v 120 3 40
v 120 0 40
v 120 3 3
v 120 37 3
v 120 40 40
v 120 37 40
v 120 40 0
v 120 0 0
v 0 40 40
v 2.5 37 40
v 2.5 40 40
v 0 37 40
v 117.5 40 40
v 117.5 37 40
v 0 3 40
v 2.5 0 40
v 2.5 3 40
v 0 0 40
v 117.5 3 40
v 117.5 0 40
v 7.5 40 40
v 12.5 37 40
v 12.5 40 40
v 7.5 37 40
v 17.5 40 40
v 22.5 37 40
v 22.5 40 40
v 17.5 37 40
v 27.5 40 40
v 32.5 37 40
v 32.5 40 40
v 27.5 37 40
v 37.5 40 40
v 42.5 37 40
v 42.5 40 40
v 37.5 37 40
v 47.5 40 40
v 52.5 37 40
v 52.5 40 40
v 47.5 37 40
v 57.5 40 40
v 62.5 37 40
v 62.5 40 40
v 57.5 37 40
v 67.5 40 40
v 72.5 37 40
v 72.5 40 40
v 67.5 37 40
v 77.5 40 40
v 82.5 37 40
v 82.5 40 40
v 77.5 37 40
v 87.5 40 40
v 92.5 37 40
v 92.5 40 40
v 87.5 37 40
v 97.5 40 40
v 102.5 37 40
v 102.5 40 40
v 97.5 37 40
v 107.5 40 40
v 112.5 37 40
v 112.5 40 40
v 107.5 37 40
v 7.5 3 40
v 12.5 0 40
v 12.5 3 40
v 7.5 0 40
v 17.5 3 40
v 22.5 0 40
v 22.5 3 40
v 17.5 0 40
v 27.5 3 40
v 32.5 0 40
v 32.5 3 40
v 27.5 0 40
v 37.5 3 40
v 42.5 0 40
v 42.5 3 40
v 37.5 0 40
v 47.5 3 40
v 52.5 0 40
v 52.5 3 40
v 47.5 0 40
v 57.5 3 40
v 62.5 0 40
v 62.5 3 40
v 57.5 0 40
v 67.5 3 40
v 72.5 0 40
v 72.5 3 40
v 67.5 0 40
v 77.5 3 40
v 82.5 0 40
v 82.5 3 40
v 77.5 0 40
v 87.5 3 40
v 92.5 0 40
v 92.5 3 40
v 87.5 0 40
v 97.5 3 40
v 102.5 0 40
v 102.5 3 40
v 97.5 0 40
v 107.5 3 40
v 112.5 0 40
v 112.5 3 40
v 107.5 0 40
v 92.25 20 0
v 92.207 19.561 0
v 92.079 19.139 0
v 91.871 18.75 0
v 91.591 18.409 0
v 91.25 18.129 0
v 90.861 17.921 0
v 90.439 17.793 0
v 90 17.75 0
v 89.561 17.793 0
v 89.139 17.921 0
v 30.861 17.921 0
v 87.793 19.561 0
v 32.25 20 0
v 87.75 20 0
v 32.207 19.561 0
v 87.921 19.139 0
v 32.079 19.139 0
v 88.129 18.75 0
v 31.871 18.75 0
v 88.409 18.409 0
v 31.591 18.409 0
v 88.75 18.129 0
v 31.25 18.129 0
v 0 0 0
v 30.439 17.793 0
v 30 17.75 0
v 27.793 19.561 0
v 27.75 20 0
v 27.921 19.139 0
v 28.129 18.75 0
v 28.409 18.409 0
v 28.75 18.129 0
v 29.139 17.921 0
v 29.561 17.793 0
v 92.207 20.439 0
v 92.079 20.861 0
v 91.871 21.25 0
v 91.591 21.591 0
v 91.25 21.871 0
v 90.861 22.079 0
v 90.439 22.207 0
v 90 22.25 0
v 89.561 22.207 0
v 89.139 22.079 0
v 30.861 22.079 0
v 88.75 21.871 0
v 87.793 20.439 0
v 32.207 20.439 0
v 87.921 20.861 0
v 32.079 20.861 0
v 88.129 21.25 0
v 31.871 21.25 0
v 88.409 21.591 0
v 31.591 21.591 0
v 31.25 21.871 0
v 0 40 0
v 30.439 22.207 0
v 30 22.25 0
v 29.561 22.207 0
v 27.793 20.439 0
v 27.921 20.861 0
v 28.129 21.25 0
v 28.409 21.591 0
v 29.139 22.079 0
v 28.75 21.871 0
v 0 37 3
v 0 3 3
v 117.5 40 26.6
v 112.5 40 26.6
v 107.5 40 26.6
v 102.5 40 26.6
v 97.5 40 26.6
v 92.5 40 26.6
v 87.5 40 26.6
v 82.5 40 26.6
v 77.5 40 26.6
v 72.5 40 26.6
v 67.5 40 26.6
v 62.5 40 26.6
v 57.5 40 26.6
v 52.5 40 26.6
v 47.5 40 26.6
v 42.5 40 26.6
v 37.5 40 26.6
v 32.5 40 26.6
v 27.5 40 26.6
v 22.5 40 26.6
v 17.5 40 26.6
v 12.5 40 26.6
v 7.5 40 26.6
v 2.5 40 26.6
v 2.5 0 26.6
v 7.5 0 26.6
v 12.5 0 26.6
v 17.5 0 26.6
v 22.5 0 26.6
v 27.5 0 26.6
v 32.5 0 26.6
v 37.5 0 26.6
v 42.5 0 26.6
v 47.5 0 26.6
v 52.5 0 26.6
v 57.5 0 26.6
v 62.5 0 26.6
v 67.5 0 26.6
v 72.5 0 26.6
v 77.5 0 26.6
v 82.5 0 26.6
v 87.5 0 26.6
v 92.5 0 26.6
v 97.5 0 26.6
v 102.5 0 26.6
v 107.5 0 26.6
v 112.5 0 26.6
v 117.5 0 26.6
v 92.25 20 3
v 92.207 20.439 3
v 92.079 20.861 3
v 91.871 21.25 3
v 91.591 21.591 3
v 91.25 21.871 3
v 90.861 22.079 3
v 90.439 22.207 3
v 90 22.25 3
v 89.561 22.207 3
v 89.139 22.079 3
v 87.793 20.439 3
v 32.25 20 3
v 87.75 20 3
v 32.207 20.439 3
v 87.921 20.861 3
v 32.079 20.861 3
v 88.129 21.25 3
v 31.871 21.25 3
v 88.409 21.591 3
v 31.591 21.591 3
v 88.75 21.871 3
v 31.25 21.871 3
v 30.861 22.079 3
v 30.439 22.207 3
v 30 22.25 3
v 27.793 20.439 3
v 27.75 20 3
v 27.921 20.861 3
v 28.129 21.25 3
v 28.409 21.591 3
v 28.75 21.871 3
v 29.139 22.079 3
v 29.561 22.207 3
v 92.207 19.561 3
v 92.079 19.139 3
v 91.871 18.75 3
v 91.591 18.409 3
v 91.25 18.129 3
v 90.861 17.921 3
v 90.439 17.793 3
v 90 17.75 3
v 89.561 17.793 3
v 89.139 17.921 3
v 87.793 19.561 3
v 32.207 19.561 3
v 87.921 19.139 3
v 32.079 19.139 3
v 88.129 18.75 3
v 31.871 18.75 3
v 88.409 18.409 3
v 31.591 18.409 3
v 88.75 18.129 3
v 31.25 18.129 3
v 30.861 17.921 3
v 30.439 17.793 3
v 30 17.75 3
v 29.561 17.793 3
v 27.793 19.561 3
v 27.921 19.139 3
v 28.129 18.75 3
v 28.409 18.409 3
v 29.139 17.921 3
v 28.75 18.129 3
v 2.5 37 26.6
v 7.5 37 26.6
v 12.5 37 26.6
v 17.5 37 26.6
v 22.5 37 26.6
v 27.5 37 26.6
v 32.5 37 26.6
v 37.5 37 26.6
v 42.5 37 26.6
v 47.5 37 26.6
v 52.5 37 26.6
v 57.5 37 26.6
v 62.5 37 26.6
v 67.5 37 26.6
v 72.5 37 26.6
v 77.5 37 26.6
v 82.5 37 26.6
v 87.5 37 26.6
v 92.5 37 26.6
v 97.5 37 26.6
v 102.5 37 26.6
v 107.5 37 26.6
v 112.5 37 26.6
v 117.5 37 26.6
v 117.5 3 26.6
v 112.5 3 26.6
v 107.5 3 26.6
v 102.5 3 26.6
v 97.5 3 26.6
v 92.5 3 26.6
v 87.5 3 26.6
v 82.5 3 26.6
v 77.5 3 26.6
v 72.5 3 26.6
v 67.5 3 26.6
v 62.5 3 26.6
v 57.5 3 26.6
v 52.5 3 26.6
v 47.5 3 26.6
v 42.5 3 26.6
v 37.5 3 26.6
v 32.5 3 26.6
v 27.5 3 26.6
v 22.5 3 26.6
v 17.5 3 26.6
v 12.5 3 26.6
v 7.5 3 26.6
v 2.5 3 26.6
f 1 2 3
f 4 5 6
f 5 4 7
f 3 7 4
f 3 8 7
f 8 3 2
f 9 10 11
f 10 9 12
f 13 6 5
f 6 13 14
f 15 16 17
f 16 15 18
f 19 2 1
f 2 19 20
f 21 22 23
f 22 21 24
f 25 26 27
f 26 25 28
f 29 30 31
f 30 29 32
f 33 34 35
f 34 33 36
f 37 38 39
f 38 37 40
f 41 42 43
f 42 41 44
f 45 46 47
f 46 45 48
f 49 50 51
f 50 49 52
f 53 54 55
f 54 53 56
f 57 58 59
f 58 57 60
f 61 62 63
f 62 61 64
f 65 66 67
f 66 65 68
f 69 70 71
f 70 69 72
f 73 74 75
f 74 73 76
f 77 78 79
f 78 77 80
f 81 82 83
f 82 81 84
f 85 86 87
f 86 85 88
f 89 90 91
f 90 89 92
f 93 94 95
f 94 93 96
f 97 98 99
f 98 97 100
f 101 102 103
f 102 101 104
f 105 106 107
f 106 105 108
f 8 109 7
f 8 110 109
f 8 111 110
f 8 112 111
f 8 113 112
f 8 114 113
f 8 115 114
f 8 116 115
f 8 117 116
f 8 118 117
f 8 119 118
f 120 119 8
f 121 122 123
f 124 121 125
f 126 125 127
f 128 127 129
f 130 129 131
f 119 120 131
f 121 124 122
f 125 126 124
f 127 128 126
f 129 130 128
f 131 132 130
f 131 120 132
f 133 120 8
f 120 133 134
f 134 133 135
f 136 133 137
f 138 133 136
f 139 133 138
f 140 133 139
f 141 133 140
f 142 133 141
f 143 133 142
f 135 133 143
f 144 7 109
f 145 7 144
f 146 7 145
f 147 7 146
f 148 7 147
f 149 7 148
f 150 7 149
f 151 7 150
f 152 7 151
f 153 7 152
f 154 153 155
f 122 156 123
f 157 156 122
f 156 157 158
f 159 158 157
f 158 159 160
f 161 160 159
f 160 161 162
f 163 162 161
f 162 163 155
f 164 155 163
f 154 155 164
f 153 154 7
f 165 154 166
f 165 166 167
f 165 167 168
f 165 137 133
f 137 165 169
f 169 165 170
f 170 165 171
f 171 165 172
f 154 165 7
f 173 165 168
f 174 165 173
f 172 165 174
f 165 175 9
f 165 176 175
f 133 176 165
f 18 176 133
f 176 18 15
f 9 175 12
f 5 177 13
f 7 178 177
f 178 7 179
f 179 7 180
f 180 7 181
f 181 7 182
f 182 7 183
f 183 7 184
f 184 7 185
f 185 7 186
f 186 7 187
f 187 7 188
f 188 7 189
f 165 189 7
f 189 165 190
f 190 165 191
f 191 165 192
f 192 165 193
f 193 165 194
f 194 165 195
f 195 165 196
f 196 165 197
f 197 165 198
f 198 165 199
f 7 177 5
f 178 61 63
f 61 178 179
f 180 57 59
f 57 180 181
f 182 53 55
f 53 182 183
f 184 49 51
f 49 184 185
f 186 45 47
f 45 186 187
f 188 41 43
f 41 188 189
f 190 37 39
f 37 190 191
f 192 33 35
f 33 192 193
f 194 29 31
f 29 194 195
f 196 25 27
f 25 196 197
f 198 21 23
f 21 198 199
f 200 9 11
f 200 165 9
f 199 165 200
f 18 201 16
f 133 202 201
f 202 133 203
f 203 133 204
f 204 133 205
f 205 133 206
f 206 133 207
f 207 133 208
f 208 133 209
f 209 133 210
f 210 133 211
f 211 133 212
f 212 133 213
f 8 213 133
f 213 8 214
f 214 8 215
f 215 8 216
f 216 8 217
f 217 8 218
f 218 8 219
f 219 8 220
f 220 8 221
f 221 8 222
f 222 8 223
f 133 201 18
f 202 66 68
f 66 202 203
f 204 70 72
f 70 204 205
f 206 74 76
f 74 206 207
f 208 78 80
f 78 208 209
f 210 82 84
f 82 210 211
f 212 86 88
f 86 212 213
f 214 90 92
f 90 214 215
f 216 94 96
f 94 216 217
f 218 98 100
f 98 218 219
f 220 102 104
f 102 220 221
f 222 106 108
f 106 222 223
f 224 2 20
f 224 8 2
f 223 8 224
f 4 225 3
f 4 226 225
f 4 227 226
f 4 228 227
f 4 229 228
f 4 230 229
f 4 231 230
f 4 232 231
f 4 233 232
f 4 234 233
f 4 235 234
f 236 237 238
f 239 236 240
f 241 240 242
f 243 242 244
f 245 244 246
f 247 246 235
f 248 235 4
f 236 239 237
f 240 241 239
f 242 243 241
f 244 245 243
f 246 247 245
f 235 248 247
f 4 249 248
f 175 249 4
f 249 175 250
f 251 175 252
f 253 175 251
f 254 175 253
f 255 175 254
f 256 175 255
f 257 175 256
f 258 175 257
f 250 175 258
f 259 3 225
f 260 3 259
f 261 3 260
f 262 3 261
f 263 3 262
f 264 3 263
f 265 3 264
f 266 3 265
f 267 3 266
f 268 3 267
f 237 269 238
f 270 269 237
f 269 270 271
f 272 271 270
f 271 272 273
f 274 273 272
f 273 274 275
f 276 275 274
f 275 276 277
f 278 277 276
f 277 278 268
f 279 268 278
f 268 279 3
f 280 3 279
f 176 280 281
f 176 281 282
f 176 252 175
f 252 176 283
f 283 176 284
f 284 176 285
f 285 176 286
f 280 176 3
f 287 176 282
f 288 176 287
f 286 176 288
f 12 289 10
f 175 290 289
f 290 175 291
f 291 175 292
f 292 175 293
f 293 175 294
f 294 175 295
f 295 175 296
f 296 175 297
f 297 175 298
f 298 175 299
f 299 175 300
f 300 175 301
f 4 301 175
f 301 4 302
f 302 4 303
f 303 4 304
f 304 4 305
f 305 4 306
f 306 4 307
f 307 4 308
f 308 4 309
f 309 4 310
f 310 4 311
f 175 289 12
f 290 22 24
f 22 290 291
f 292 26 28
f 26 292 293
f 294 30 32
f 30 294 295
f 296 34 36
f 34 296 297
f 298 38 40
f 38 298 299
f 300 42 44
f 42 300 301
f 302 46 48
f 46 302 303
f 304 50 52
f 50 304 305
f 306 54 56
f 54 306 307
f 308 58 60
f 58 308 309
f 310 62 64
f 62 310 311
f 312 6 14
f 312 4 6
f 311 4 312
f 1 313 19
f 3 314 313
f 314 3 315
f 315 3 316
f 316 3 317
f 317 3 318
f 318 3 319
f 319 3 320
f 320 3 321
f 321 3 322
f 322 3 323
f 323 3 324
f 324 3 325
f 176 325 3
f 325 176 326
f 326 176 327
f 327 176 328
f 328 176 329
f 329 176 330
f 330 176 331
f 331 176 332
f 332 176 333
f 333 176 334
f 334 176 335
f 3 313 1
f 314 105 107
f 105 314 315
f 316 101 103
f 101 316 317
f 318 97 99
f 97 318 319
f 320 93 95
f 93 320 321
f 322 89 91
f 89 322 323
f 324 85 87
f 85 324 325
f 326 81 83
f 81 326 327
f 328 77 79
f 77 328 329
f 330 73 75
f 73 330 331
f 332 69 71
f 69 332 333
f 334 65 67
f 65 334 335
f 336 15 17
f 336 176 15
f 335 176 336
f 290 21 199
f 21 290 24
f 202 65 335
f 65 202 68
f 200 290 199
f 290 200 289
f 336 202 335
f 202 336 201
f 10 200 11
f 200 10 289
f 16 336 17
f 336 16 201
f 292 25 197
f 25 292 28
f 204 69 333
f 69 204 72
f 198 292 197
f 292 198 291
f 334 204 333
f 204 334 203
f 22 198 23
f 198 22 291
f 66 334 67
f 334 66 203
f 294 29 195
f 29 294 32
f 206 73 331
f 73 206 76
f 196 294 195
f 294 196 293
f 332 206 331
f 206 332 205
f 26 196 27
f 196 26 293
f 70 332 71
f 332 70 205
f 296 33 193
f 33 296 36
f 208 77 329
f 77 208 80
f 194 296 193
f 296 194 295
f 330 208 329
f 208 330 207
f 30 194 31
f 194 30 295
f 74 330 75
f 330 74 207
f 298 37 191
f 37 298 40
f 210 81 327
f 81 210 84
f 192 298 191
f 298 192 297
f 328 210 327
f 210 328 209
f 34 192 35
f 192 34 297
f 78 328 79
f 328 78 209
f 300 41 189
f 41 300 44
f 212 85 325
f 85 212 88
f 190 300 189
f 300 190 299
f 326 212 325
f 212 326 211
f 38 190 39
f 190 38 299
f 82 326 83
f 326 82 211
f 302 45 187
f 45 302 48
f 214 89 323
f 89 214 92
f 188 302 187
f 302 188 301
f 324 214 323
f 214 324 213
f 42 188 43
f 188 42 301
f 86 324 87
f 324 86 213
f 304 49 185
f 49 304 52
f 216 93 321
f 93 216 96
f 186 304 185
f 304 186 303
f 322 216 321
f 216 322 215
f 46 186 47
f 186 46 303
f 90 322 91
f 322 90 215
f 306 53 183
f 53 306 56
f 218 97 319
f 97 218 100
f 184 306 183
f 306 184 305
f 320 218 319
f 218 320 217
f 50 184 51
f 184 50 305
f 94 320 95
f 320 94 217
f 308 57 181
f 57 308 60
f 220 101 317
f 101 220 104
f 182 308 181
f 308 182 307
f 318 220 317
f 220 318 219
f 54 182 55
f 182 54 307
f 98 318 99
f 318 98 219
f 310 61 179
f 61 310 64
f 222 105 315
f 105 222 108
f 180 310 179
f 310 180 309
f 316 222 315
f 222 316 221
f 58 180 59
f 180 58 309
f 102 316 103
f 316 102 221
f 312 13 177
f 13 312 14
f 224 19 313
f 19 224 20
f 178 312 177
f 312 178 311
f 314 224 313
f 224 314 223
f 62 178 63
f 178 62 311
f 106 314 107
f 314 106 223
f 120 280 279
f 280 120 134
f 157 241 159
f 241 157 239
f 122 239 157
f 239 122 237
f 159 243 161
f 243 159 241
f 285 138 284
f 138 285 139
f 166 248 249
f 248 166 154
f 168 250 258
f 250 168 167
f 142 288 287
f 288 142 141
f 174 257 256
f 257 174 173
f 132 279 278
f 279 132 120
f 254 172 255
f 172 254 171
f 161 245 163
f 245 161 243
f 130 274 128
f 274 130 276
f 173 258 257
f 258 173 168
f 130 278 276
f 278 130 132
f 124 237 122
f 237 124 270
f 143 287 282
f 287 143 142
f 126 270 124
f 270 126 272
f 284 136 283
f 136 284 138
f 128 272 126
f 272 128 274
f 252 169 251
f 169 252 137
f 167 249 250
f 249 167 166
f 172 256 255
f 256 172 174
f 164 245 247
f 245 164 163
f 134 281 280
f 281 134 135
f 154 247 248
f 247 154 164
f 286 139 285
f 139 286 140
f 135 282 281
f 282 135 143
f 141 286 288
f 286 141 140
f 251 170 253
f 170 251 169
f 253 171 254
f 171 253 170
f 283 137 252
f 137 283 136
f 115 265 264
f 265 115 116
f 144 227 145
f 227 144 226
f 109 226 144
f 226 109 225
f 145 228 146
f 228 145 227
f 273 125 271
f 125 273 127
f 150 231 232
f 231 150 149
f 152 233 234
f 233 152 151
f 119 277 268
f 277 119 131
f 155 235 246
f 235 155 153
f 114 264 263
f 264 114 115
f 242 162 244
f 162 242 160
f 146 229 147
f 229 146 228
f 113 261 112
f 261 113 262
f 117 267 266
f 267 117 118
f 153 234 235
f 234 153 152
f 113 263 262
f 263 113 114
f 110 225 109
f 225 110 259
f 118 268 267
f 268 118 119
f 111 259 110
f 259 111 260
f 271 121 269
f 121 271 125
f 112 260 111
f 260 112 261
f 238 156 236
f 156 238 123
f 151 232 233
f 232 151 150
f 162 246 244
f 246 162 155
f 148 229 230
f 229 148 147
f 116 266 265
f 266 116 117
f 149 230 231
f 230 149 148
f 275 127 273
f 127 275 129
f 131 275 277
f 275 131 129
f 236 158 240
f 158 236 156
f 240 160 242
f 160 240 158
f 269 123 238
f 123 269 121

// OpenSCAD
$fn = 32;

// ----------------------------------------------------------------------
// Cable duct: 120 x 40 x 40 mm, 12 fingers
// ----------------------------------------------------------------------

// --- parameters (mm) ---
channel_l = 120;          // duct length, X
channel_w = 40;           // duct width, Y
channel_h = 40;           // duct height, Z
channel_t = 3;            // side wall thickness
floor_t = 3;              // floor thickness
slot_w = 5;               // finger slot width
slot_h = 23.6;            // finger slot height
fingers = 12;             // number of finger slots per side
pitch = 10;               // finger pitch
hole_d = 4.5;             // floor mounting hole
hole_n = 2;               // mounting holes in the floor

module shell() {
  difference() {
    cube([channel_l, channel_w, channel_h]);
    /* open top channel */
    translate([-channel_t - 1, channel_t, floor_t])
      cube([channel_l + 2 * channel_t + 2, channel_w - 2 * channel_t, channel_h + 1]);
  }
}

difference() {
  union() {
    shell();
  }
  /* finger slots cut through both side walls */
  for (i = [0 : fingers - 1]) translate([pitch / 2 + i * pitch - slot_w / 2, -1, floor_t + slot_h]) cube([slot_w, channel_w + 2, channel_h]);
  for (i = [0 : hole_n - 1]) translate([(channel_l / hole_n) * (i + 0.5), channel_w / 2, -1]) cylinder(h = floor_t + 2, d = hole_d);
}
